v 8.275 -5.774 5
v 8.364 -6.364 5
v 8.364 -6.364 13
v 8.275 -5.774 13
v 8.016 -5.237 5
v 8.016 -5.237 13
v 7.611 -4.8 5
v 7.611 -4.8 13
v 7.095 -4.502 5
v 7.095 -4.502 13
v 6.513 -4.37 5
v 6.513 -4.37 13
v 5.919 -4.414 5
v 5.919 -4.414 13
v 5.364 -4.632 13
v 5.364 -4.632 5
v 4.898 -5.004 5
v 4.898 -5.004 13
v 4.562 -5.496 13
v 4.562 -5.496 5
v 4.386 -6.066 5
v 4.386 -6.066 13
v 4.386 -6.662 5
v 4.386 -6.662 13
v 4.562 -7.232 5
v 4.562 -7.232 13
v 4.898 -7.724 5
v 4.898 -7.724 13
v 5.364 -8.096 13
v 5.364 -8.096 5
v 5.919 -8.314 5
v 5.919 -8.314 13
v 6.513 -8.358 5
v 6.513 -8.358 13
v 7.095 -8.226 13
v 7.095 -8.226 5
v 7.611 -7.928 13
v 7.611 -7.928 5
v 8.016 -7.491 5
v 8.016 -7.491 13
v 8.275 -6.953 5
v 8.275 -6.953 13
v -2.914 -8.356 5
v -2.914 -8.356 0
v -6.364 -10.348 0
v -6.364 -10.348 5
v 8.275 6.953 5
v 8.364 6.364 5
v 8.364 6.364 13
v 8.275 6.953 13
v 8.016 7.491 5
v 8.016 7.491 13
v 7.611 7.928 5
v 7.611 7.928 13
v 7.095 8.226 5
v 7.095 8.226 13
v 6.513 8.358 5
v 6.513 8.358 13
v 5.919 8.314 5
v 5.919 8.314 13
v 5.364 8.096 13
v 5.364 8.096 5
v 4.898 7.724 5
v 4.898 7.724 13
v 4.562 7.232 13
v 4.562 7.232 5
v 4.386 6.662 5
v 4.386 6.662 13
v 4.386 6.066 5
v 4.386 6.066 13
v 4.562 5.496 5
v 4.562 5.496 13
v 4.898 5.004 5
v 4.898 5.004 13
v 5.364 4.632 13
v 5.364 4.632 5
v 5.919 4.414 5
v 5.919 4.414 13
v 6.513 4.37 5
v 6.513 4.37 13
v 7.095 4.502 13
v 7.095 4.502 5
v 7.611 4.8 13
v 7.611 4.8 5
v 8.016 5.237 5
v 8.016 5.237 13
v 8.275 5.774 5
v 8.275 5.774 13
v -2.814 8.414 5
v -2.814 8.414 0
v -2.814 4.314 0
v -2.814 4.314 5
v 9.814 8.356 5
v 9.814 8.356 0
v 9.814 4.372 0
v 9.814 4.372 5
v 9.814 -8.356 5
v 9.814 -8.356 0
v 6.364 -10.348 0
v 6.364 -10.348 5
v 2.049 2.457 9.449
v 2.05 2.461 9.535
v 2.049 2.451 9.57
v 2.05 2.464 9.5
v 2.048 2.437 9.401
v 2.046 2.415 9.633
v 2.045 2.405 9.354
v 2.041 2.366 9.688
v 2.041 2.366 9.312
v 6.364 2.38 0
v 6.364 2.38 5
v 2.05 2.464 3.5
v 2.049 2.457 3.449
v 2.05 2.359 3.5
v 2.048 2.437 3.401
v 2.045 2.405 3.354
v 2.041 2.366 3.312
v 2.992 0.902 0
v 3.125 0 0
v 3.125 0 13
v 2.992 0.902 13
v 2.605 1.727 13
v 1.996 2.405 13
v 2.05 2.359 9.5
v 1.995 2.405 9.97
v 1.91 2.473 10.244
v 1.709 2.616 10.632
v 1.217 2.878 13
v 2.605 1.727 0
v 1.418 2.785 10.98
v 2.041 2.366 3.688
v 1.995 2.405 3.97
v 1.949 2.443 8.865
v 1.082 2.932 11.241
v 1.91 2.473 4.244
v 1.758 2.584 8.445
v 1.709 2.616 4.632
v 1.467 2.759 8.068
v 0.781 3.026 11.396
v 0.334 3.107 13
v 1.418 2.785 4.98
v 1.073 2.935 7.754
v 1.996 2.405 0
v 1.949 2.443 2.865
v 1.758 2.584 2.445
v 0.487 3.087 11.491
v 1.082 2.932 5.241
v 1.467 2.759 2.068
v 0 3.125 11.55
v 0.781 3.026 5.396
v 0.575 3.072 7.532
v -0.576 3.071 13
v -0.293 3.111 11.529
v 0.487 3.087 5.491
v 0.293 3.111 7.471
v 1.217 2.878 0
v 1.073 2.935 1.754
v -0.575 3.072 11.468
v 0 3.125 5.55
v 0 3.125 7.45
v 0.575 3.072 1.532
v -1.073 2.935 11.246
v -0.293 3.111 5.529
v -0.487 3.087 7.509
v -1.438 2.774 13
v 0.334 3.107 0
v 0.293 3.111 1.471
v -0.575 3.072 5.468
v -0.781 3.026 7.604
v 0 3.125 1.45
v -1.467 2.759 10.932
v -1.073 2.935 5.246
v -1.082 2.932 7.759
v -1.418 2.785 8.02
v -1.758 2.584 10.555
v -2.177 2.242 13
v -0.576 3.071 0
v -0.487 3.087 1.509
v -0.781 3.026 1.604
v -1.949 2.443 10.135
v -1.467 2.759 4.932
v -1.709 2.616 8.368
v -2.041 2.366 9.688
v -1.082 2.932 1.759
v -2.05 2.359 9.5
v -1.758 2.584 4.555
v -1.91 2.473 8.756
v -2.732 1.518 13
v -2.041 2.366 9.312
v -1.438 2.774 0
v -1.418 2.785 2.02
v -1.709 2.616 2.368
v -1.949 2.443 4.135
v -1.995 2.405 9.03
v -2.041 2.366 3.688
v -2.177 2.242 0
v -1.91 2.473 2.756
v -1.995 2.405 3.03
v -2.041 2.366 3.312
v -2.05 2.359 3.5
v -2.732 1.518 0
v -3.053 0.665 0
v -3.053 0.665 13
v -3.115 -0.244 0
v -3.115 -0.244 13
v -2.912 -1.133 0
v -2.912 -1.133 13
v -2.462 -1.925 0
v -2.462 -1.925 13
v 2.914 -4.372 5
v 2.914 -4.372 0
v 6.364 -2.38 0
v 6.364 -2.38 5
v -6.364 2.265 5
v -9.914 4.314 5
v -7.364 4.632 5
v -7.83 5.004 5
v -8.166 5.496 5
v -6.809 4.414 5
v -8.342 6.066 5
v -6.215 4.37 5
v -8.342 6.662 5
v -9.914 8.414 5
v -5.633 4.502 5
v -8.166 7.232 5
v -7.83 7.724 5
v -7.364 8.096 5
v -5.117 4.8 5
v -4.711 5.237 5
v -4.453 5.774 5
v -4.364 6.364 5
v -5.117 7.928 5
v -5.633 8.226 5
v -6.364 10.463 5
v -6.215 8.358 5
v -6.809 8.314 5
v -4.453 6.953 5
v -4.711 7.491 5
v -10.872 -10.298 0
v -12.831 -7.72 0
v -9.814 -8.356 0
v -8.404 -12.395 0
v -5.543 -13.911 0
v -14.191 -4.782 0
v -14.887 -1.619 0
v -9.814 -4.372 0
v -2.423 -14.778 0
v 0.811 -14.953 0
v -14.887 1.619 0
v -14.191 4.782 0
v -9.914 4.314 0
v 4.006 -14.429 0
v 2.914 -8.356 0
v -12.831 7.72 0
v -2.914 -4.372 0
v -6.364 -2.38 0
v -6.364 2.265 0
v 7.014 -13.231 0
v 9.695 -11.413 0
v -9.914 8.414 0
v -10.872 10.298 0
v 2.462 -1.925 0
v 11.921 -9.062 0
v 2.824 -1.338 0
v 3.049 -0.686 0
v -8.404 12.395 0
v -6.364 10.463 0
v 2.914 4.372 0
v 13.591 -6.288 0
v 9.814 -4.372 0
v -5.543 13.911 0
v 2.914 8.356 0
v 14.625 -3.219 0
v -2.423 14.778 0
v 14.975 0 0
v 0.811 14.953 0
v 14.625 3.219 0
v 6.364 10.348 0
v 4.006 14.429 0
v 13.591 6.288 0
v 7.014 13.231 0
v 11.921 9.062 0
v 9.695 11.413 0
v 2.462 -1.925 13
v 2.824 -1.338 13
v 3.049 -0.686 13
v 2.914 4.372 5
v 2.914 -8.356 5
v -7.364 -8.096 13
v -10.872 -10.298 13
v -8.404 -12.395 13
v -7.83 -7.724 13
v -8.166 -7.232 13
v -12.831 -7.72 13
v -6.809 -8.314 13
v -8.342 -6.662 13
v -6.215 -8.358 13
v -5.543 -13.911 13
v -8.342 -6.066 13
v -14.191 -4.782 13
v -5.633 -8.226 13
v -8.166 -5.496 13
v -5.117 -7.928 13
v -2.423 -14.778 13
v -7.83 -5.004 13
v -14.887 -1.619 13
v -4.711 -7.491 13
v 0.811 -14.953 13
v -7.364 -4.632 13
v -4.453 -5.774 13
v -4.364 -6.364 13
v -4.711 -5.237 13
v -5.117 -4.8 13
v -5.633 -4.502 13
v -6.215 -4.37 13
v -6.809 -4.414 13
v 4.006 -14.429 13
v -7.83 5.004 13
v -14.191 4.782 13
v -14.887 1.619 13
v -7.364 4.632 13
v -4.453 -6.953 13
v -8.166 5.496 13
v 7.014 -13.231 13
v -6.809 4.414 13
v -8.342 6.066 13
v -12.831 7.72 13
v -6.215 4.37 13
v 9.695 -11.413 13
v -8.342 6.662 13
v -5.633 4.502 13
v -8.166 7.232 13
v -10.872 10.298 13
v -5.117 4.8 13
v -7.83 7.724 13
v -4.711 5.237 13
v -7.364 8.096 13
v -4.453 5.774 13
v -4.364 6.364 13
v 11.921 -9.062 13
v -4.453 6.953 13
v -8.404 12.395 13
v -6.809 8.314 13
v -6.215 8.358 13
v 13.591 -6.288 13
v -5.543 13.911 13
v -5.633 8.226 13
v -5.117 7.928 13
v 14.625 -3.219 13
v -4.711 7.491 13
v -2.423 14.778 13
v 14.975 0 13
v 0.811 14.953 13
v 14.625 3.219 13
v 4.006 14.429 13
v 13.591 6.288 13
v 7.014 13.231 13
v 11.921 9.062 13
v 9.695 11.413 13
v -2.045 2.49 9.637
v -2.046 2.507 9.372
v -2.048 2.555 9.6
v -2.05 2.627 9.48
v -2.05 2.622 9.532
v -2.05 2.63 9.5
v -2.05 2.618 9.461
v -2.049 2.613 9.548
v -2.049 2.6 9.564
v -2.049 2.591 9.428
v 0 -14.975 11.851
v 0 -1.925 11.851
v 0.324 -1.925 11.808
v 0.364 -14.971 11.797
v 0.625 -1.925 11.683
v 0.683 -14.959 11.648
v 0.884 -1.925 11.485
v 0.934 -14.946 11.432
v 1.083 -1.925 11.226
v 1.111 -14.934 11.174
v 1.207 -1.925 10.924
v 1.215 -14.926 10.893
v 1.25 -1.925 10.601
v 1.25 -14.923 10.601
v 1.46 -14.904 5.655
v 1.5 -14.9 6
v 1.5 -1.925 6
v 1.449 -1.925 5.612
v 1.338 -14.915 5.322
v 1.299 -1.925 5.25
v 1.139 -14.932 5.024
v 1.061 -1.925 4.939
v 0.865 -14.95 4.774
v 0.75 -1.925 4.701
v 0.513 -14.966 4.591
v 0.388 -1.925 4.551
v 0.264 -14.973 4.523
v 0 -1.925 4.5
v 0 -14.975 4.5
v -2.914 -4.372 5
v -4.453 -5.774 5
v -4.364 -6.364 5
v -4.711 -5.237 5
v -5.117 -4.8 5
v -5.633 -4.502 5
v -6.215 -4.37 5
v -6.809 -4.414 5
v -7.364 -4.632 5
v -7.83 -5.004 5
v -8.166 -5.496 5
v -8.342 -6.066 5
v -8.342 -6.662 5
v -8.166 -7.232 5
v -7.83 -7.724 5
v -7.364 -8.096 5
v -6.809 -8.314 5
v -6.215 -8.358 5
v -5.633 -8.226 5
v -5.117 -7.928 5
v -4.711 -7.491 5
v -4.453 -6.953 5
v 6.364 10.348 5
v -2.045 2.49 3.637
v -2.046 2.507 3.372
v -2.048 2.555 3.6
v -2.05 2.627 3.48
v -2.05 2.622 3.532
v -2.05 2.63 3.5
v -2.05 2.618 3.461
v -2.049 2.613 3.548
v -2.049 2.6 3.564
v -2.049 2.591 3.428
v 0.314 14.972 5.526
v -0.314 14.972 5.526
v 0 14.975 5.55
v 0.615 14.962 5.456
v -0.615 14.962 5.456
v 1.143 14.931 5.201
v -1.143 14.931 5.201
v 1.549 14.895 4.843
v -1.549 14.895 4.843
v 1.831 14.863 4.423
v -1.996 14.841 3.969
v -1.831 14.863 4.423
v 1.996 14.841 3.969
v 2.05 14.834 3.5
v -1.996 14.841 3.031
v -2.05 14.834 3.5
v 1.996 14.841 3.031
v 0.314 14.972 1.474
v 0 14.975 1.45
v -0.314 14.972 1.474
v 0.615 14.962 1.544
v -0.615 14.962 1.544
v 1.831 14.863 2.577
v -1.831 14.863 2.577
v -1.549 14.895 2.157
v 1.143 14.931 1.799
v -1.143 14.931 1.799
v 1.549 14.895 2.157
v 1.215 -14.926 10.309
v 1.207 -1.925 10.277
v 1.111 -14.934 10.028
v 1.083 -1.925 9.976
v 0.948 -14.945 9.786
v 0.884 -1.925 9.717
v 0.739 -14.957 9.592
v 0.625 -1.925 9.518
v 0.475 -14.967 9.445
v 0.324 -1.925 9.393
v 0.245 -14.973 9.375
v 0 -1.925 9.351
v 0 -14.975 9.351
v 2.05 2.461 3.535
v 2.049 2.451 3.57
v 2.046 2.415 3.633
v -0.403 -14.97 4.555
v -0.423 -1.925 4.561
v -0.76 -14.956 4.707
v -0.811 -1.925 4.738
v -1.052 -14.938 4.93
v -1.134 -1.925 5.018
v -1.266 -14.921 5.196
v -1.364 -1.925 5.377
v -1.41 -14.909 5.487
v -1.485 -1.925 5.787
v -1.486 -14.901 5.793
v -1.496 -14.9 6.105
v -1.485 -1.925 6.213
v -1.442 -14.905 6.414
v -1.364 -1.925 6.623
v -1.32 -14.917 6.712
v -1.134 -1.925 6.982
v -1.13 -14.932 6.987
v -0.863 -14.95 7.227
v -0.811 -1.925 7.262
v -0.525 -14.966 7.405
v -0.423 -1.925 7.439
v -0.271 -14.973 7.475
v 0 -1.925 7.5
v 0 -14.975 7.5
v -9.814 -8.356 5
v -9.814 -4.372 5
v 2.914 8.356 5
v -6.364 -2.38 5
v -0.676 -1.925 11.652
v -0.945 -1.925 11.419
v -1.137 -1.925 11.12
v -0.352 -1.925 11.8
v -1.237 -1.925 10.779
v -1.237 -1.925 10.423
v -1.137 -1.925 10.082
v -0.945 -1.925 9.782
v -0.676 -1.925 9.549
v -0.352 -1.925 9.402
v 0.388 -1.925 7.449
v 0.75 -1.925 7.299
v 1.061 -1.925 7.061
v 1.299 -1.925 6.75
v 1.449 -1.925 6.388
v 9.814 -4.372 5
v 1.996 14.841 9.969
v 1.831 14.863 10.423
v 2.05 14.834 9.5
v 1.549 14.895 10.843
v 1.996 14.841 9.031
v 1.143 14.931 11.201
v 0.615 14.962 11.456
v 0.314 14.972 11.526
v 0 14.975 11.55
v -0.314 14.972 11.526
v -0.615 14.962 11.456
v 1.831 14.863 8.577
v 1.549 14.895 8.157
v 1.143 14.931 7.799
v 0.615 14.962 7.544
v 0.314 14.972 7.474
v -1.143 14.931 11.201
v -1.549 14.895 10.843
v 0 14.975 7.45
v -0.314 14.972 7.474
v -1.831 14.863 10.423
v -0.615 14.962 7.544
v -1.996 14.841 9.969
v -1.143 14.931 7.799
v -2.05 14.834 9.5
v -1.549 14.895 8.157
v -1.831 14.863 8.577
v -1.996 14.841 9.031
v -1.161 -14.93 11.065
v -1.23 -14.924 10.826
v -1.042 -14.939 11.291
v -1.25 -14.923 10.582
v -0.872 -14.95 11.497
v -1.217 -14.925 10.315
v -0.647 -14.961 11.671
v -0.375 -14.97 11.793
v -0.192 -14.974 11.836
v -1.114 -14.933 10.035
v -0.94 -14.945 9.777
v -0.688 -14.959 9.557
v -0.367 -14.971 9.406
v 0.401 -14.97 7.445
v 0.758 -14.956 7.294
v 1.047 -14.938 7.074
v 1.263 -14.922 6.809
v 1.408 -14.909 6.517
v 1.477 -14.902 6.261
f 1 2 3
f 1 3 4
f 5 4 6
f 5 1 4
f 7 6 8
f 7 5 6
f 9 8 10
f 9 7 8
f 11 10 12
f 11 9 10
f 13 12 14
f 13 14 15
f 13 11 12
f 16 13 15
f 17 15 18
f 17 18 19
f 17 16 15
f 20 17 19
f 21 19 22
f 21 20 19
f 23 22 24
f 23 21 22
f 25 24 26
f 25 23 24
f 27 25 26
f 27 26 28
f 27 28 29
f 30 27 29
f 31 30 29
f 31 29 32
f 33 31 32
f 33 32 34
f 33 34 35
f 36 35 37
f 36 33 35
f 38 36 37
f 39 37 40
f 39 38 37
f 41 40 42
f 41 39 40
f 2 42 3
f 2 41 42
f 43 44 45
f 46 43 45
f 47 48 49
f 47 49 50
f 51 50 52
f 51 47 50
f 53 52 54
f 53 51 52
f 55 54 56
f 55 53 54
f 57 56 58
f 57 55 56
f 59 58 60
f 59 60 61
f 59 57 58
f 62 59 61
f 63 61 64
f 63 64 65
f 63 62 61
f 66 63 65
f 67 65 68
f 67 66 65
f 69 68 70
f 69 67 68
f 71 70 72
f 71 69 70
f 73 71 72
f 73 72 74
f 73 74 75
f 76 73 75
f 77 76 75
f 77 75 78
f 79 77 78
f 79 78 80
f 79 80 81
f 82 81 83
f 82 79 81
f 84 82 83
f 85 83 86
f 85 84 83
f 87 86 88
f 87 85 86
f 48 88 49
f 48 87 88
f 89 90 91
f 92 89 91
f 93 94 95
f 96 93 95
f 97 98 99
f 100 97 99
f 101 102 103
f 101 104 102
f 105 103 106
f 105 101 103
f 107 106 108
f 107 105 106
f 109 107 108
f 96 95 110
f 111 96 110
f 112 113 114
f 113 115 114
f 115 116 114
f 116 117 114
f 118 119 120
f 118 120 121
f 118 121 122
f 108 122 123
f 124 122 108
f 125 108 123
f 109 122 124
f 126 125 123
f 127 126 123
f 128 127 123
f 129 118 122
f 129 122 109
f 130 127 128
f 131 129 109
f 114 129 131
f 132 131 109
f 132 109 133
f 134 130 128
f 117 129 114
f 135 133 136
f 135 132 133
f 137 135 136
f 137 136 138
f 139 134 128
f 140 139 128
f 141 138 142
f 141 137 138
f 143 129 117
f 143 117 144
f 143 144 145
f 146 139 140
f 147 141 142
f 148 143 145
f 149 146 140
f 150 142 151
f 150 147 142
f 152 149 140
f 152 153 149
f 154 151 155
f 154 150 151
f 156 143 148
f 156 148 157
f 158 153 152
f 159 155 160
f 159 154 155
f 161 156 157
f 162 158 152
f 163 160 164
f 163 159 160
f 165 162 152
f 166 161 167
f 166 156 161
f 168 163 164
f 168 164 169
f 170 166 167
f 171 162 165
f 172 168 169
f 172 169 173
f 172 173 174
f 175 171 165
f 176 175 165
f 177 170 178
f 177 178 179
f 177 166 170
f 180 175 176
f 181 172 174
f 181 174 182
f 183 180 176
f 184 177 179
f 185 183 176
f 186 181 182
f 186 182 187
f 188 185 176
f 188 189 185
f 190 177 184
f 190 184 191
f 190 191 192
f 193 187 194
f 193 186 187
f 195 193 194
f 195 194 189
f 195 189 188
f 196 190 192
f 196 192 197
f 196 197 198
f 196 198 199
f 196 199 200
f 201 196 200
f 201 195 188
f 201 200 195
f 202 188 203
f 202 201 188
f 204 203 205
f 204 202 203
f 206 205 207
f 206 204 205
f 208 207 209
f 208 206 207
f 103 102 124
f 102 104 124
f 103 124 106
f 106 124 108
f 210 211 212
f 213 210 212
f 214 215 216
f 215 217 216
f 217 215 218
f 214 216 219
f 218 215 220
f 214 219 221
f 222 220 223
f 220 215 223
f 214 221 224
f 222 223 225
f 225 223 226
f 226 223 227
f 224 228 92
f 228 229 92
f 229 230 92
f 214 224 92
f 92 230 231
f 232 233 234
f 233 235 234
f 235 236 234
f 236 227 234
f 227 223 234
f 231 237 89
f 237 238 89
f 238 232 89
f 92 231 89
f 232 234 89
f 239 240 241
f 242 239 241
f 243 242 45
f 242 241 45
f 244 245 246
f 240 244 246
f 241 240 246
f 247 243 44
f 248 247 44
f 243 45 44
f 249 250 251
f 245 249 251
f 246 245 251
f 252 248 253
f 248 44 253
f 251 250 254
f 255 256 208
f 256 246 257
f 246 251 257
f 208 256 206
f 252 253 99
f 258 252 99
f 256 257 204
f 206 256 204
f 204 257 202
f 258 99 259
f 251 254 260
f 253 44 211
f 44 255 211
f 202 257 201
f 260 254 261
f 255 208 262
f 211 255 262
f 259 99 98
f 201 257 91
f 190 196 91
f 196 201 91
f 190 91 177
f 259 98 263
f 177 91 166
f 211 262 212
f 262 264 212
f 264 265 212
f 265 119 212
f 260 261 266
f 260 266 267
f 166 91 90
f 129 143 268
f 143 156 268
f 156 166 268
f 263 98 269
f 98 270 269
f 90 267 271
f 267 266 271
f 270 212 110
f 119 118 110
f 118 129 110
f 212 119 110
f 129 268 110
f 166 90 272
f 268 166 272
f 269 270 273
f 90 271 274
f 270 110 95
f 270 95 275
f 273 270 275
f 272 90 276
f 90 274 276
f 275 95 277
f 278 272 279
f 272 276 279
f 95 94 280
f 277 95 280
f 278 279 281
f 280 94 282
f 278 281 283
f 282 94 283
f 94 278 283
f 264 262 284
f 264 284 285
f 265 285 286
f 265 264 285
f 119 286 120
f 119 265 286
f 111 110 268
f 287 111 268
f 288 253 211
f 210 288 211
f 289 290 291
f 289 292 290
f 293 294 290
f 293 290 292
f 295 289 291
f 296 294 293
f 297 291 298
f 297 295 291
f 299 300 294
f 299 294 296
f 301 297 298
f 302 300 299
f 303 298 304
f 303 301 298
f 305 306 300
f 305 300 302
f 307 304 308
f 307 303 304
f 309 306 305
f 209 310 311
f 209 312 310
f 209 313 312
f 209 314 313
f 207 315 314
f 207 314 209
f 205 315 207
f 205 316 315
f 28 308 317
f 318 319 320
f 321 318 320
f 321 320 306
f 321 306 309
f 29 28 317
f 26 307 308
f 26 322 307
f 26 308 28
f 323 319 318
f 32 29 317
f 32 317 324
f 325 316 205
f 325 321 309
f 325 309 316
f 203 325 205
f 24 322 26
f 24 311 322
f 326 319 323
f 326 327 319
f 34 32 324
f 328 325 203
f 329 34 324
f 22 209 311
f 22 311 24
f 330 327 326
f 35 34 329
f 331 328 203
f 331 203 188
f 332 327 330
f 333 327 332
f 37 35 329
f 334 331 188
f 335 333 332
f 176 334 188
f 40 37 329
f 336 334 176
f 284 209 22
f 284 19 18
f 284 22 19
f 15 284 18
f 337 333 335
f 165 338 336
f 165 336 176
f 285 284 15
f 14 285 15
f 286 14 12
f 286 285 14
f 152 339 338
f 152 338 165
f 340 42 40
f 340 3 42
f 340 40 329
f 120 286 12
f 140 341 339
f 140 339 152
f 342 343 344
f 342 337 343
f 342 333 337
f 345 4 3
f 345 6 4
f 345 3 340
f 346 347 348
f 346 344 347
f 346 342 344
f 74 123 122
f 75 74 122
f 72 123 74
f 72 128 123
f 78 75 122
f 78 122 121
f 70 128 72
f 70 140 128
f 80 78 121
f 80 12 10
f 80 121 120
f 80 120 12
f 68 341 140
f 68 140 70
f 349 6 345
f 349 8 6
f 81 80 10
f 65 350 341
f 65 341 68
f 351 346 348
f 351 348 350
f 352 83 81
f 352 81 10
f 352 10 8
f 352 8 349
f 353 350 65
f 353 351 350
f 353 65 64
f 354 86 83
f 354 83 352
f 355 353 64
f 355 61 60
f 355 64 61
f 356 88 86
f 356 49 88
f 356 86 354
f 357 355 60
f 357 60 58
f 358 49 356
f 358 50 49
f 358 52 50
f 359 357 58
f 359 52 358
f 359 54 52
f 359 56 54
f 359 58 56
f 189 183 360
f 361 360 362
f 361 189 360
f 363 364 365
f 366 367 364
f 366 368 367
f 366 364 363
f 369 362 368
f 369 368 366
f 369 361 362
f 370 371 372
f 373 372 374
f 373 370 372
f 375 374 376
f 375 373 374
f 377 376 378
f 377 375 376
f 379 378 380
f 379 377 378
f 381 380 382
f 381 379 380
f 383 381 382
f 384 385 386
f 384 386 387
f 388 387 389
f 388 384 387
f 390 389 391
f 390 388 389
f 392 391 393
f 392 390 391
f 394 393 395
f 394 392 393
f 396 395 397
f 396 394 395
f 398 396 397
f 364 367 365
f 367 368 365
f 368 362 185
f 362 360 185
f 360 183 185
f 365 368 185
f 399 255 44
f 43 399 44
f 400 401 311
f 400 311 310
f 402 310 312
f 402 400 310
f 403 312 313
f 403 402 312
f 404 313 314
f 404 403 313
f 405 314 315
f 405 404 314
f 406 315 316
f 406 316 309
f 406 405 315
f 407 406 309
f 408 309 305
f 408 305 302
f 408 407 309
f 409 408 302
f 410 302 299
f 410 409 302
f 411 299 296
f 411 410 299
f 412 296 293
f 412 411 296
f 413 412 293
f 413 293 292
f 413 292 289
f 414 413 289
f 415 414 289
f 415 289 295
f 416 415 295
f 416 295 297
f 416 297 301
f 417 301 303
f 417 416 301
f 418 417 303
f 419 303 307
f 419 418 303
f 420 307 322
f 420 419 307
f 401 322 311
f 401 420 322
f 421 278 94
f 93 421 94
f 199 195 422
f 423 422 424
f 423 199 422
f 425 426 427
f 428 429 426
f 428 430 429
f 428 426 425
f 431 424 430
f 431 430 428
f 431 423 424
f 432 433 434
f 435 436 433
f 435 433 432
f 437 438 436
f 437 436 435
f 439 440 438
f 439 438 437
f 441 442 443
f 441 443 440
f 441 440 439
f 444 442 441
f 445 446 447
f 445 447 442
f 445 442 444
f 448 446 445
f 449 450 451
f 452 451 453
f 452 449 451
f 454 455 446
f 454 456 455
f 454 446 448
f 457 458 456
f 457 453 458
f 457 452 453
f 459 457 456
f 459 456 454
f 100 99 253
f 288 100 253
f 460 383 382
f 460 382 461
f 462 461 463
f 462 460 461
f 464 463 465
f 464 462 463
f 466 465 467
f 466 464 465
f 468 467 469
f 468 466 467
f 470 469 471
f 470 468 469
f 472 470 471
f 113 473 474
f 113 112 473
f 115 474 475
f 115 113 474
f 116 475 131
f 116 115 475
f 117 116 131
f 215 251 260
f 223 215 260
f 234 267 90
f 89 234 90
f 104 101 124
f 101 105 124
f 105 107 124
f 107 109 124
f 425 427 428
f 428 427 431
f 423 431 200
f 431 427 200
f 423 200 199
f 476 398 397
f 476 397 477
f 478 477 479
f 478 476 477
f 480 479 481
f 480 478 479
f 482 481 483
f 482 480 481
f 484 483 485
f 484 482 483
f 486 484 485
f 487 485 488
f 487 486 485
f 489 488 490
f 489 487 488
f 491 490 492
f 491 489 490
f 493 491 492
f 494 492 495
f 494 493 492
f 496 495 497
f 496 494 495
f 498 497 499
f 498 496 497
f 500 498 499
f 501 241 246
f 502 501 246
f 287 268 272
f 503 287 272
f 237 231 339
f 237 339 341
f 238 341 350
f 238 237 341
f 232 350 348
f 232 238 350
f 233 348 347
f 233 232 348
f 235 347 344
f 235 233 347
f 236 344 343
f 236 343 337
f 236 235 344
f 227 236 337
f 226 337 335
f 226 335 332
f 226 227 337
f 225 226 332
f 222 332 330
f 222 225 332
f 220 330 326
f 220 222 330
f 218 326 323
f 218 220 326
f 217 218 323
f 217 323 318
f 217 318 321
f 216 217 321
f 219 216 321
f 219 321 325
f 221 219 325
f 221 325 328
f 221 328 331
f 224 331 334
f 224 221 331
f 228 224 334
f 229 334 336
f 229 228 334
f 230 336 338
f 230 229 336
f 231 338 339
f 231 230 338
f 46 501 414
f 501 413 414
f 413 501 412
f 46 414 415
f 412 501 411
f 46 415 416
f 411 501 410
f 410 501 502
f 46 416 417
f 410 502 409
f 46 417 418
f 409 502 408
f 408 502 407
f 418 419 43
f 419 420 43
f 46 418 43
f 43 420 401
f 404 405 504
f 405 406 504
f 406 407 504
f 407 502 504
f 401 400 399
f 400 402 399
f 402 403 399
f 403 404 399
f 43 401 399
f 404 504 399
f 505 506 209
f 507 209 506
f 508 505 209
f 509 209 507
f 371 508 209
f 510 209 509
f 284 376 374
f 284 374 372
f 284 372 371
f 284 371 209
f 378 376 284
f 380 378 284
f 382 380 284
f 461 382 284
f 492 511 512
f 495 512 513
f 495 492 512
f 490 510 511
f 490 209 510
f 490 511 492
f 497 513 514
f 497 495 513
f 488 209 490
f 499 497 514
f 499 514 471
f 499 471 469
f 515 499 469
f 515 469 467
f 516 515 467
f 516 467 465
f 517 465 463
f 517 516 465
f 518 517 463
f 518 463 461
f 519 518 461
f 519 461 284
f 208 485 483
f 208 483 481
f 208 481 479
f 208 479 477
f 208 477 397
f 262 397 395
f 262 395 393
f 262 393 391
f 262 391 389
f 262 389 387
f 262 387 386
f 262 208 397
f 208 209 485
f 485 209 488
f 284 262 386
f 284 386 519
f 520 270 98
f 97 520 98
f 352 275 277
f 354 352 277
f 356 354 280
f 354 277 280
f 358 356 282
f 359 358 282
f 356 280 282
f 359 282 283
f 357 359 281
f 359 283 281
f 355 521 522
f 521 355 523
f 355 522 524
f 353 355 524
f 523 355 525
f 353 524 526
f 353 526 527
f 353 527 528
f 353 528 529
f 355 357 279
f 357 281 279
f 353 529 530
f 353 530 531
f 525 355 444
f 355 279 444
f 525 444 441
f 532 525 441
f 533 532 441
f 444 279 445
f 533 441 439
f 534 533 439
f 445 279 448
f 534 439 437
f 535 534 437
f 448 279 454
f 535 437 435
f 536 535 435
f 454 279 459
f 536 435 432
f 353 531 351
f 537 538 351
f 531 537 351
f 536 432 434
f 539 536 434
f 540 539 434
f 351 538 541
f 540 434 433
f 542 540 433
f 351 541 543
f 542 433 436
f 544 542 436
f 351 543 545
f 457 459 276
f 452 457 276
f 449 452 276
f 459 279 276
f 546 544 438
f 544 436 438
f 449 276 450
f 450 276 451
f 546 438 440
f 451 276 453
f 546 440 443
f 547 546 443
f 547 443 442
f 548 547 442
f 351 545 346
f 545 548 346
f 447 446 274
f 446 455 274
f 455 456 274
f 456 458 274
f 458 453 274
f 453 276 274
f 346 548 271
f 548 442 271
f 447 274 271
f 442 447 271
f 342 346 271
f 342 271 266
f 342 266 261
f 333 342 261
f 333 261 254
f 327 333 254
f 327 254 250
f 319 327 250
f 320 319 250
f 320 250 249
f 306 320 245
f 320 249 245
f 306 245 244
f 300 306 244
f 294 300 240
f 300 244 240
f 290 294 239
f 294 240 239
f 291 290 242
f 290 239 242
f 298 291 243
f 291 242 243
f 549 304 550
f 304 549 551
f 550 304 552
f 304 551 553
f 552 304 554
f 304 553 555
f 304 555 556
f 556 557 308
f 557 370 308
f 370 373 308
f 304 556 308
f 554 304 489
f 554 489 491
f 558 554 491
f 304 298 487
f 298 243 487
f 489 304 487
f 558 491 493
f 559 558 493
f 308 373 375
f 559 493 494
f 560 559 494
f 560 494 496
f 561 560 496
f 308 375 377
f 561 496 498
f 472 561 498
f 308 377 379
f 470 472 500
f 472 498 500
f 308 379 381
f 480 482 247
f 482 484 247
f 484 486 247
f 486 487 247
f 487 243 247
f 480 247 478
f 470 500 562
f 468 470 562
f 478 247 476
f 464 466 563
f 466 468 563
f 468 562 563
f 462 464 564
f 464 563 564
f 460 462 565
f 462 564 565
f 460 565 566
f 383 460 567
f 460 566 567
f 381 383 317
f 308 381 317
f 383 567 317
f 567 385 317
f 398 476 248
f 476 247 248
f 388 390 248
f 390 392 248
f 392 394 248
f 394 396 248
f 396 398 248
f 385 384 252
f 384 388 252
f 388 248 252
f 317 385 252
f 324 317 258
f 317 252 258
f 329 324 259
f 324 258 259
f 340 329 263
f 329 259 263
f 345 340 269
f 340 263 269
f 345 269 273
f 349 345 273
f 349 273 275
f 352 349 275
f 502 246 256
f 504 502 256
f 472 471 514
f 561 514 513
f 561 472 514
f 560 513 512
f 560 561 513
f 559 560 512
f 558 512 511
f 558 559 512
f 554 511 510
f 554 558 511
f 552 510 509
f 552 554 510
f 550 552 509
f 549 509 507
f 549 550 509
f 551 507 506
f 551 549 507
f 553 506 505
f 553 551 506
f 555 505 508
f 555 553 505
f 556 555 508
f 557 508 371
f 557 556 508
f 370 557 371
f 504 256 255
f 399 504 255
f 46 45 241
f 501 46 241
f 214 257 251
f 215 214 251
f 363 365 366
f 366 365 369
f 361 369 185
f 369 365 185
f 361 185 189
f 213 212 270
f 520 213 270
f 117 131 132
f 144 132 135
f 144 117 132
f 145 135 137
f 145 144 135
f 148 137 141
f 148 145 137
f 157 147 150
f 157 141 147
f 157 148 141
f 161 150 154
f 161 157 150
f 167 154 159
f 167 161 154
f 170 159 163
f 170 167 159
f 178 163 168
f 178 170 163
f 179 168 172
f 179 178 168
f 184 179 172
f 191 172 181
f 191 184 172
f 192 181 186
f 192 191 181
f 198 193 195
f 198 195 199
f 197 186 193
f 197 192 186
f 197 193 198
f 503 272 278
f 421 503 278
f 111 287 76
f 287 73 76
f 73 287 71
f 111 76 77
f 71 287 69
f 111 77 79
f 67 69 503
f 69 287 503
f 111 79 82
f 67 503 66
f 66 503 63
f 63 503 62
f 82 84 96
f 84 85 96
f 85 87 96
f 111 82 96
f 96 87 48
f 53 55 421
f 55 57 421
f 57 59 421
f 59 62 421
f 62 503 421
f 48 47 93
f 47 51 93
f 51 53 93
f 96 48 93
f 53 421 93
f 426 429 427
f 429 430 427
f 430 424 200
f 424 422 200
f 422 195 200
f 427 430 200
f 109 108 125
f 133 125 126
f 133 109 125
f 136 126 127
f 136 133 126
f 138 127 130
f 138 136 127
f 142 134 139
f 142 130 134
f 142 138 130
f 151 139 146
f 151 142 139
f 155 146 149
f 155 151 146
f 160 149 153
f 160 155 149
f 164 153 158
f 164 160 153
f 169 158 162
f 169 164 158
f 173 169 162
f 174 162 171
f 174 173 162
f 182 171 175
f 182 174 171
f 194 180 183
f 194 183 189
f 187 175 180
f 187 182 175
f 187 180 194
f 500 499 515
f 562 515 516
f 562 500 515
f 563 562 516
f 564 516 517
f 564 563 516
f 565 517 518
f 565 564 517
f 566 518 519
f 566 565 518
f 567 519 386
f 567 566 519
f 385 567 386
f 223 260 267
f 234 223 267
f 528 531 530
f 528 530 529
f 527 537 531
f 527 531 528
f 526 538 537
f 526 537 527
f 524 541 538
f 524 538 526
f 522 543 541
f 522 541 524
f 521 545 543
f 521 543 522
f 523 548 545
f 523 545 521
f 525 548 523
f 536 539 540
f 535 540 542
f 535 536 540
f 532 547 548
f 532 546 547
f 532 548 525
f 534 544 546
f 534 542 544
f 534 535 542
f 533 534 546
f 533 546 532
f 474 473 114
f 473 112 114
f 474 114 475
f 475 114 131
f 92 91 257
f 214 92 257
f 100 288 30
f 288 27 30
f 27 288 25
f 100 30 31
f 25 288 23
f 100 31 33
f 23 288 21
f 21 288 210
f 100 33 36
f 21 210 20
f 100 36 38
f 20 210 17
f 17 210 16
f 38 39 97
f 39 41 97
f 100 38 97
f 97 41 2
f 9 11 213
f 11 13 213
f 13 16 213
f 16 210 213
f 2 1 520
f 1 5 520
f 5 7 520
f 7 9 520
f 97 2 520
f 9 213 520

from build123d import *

# Parameters (mm, degrees)
CUT_EXTRUDE1_START       = -13
CUT_EXTRUDE1_OUTLINE_R   = 14.975
CUT_EXTRUDE1_OUTLINE_R_2 = 3.125
CUT_EXTRUDE1_DEPTH       = 13
CUT_EXTRUDE1_START_2     = -8
CUT_EXTRUDE1_2_OUTLINE_R = 2
CUT_EXTRUDE1_2_DEPTH     = 8
CUT_EXTRUDE3_DEPTH       = 5
BOSS_EXTRUDE1_DEPTH      = 13
CUT_EXTRUDE4_DEPTH       = 2
CUT_EXTRUDE4_DEPTH_BACK  = 22
BOSS_EXTRUDE2_REACH      = 26.85


with BuildPart() as part:
    # Cut-Extrude1: read off the stored shape, not the designer's step
    # Cut-Extrude1 outline → Cut-Extrude1 (new body)
    with BuildSketch(Plane.XY.offset(13).offset(CUT_EXTRUDE1_START)):
        Circle(CUT_EXTRUDE1_OUTLINE_R)
        Polygon((-6.363961031, -2.380244173), (-2.913961031, -4.372102602), (-2.913961031, -8.355819459), (-6.363961031, -10.347677888), (-9.813961031, -8.355819459), (-9.813961031, -4.372102602), align=None, mode=Mode.SUBTRACT)
        Polygon((9.813961031, -8.355819459), (6.363961031, -10.347677888), (2.913961031, -8.355819459), (2.913961031, -4.372102602), (6.363961031, -2.380244173), (9.813961031, -4.372102602), align=None, mode=Mode.SUBTRACT)
        Circle(CUT_EXTRUDE1_OUTLINE_R_2, mode=Mode.SUBTRACT)
        Polygon((-9.813961031, 8.355819459), (-6.363961031, 10.347677888), (-2.913961031, 8.355819459), (-2.913961031, 4.372102602), (-6.363961031, 2.380244173), (-9.813961031, 4.372102602), align=None, mode=Mode.SUBTRACT)
        Polygon((6.363961031, 2.380244173), (2.913961031, 4.372102602), (2.913961031, 8.355819459), (6.363961031, 10.347677888), (9.813961031, 8.355819459), (9.813961031, 4.372102602), align=None, mode=Mode.SUBTRACT)
    extrude(amount=CUT_EXTRUDE1_DEPTH)

    # Cut-Extrude1 2 outline → Cut-Extrude1 2 (add)
    # profile 1 of 4: a face of its own
    with BuildSketch(Plane.XY.offset(13).offset(CUT_EXTRUDE1_START_2)):
        Polygon((2.913961031, -8.355819459), (6.363961031, -10.347677888), (9.813961031, -8.355819459), (9.813961031, -4.372102602), (6.363961031, -2.380244173), (2.913961031, -4.372102602), align=None)
        with Locations((6.363961031, -6.363961031)):
            Circle(CUT_EXTRUDE1_2_OUTLINE_R, mode=Mode.SUBTRACT)
    # profile 2 of 4: a face of its own
    with BuildSketch(Plane.XY.offset(13).offset(CUT_EXTRUDE1_START_2)):
        Polygon((-2.913961031, -8.355819459), (-2.913961031, -4.372102602), (-6.363961031, -2.380244173), (-9.813961031, -4.372102602), (-9.813961031, -8.355819459), (-6.363961031, -10.347677888), align=None)
        with Locations((-6.363961031, -6.363961031)):
            Circle(CUT_EXTRUDE1_2_OUTLINE_R, mode=Mode.SUBTRACT)
    # profile 3 of 4: a face of its own
    with BuildSketch(Plane.XY.offset(13).offset(CUT_EXTRUDE1_START_2)):
        Polygon((-2.913961031, 8.355819459), (-6.363961031, 10.347677888), (-9.813961031, 8.355819459), (-9.813961031, 4.372102602), (-6.363961031, 2.380244173), (-2.913961031, 4.372102602), align=None)
        with Locations((-6.363961031, 6.363961031)):
            Circle(CUT_EXTRUDE1_2_OUTLINE_R, mode=Mode.SUBTRACT)
    # profile 4 of 4: a face of its own
    with BuildSketch(Plane.XY.offset(13).offset(CUT_EXTRUDE1_START_2)):
        Polygon((2.913961031, 8.355819459), (2.913961031, 4.372102602), (6.363961031, 2.380244173), (9.813961031, 4.372102602), (9.813961031, 8.355819459), (6.363961031, 10.347677888), align=None)
        with Locations((6.363961031, 6.363961031)):
            Circle(CUT_EXTRUDE1_2_OUTLINE_R, mode=Mode.SUBTRACT)
    extrude(amount=CUT_EXTRUDE1_2_DEPTH)

    # Cut-Extrude1 3: loft between two sections, ruled curve by curve
    cut_extrude1_3_from = [
        Edge.make_three_point_arc((0, 14.975, 1.45), (1.449568901, 14.975, 2.050431099), (2.05, 14.975, 3.5)),
        Edge.make_three_point_arc((2.05, 14.975, 3.5), (1.449568901, 14.975, 4.949568901), (0, 14.975, 5.55)),
        Edge.make_three_point_arc((0, 14.975, 5.55), (-1.449568901, 14.975, 4.949568901), (-2.05, 14.975, 3.5)),
        Edge.make_three_point_arc((-2.05, 14.975, 3.5), (-1.449568901, 14.975, 2.050431099), (0, 14.975, 1.45)),
    ]
    cut_extrude1_3_to = [
        Edge.make_three_point_arc((0, 2.358384549, 1.45), (1.449568901, 2.358384549, 2.050431099), (2.05, 2.358384549, 3.5)),
        Edge.make_three_point_arc((2.05, 2.358384549, 3.5), (1.449568901, 2.358384549, 4.949568901), (0, 2.358384549, 5.55)),
        Edge.make_three_point_arc((0, 2.358384549, 5.55), (-1.449568901, 2.358384549, 4.949568901), (-2.05, 2.358384549, 3.5)),
        Edge.make_three_point_arc((-2.05, 2.358384549, 3.5), (-1.449568901, 2.358384549, 2.050431099), (0, 2.358384549, 1.45)),
    ]
    cut_extrude1_3 = Solid(Shell([*[Face.make_surface_from_curves(cut_extrude1_3_from[k], cut_extrude1_3_to[k]) for k in range(4)], Face(Wire(cut_extrude1_3_from)), Face(Wire(cut_extrude1_3_to))]))
    add(cut_extrude1_3, mode=Mode.SUBTRACT)

    # Cut-Extrude1 4: loft between two sections, ruled curve by curve
    cut_extrude1_4_from = [
        Edge.make_three_point_arc((0, 14.975, 7.45), (1.449568901, 14.975, 8.050431099), (2.05, 14.975, 9.5)),
        Edge.make_three_point_arc((2.05, 14.975, 9.5), (1.449568901, 14.975, 10.949568901), (0, 14.975, 11.55)),
        Edge.make_three_point_arc((0, 14.975, 11.55), (-1.449568901, 14.975, 10.949568901), (-2.05, 14.975, 9.5)),
        Edge.make_three_point_arc((-2.05, 14.975, 9.5), (-1.449568901, 14.975, 8.050431099), (0, 14.975, 7.45)),
    ]
    cut_extrude1_4_to = [
        Edge.make_three_point_arc((0, 2.358384549, 7.45), (1.449568901, 2.358384549, 8.050431099), (2.05, 2.358384549, 9.5)),
        Edge.make_three_point_arc((2.05, 2.358384549, 9.5), (1.449568901, 2.358384549, 10.949568901), (0, 2.358384549, 11.55)),
        Edge.make_three_point_arc((0, 2.358384549, 11.55), (-1.449568901, 2.358384549, 10.949568901), (-2.05, 2.358384549, 9.5)),
        Edge.make_three_point_arc((-2.05, 2.358384549, 9.5), (-1.449568901, 2.358384549, 8.050431099), (0, 2.358384549, 7.45)),
    ]
    cut_extrude1_4 = Solid(Shell([*[Face.make_surface_from_curves(cut_extrude1_4_from[k], cut_extrude1_4_to[k]) for k in range(4)], Face(Wire(cut_extrude1_4_from)), Face(Wire(cut_extrude1_4_to))]))
    add(cut_extrude1_4, mode=Mode.SUBTRACT)

    # Sketch2 → Cut-Extrude3 (cut)
    with BuildSketch(Plane(origin=(0, 0, 0), x_dir=(-1, 0, 0), z_dir=(0, 0, -1))):
        Polygon((2.813961031, 8.413554486), (2.813961031, 4.314367575), (6.363961031, 2.264774119), (9.913961031, 4.314367575), (9.913961031, 8.413554486), (6.363961031, 10.463147942), align=None)
    extrude(amount=-CUT_EXTRUDE3_DEPTH, mode=Mode.SUBTRACT)

    # Sketch4 → Boss-Extrude1 (add)
    with BuildSketch(Plane(origin=(0, 0, 0), x_dir=(-1, 0, 0), z_dir=(0, 0, -1))):
        with BuildLine():
            ThreePointArc((-2.461706725, -1.925), (-1.369306394, -2.809025632), (0, -3.125))
            Line((0, -3.125), (0, -1.925))
            Line((0, -1.925), (-2.461706725, -1.925))
        make_face()
        with BuildLine():
            Line((0, -1.925), (0, -3.125))
            ThreePointArc((0, -3.125), (1.369306394, -2.809025632), (2.461706725, -1.925))
            Line((2.461706725, -1.925), (0, -1.925))
        make_face()
    extrude(amount=-BOSS_EXTRUDE1_DEPTH)

    # Sketch3 → Cut-Extrude4 (cut, two sides: drawn at the far end of the back side and taken through both)
    with BuildSketch(Plane(origin=(0, 0, 0), x_dir=(1, 0, 0), z_dir=(0, 1, 0)).offset(-CUT_EXTRUDE4_DEPTH_BACK)):
        with BuildLine():
            ThreePointArc((0, -4.5), (-1.5, -6), (0, -7.5))
            Line((0, -7.5), (0, -4.5))
        make_face()
        with BuildLine():
            Line((0, -4.5), (0, -7.5))
            ThreePointArc((0, -7.5), (1.060660172, -7.060660172), (1.5, -6))
            ThreePointArc((1.5, -6), (1.060660172, -4.939339828), (0, -4.5))
        make_face()
        with BuildLine():
            ThreePointArc((0, -9.350905038), (-1.25, -10.600905038), (0, -11.850905038))
            Line((0, -11.850905038), (0, -9.350905038))
        make_face()
        with BuildLine():
            Line((0, -9.350905038), (0, -11.850905038))
            ThreePointArc((0, -11.850905038), (0.883883476, -11.484788515), (1.25, -10.600905038))
            ThreePointArc((1.25, -10.600905038), (0.883883476, -9.717021562), (0, -9.350905038))
        make_face()
    extrude(amount=CUT_EXTRUDE4_DEPTH + CUT_EXTRUDE4_DEPTH_BACK, mode=Mode.SUBTRACT)

    # Sketch5 → Boss-Extrude2 (add, up to next)
    with BuildSketch(Plane(origin=(0, 0, 0), x_dir=(-1, 0, 0), z_dir=(0, 0, -1)), mode=Mode.PRIVATE) as boss_extrude2_sk1:
        with BuildLine():
            Line((-4.568894393, 14.260989763), (-3.6536631, 9.845398343))
            Line((-3.6536631, 9.845398343), (-2.698785597, 9.845398343))
            Line((-2.698785597, 9.845398343), (-2.04137138, 2.366099721))
            ThreePointArc((-2.04137138, 2.366099721), (0, 3.125), (2.04137138, 2.366099721))
            Line((2.04137138, 2.366099721), (2.335168556, 11.338349863))
            Line((2.335168556, 11.338349863), (6.630079619, 11.338349863))
            Line((6.630079619, 11.338349863), (8.4371537, 9.779282306))
            Line((8.4371537, 9.779282306), (9.782251652, 11.338349863))
            ThreePointArc((9.782251652, 11.338349863), (2.988348955, 14.673799628), (-4.568894393, 14.260989763))
        make_face()
    boss_extrude2_tool1 = extrude(boss_extrude2_sk1.sketch, amount=-BOSS_EXTRUDE2_REACH, mode=Mode.PRIVATE) - part.part
    add(boss_extrude2_tool1.solids().sort_by_distance((-0.855715, 10.107885, 0))[0])
    add(boss_extrude2_tool1.solids().sort_by_distance((-0.855715, 10.107885, 0))[1])


solid = part.part
